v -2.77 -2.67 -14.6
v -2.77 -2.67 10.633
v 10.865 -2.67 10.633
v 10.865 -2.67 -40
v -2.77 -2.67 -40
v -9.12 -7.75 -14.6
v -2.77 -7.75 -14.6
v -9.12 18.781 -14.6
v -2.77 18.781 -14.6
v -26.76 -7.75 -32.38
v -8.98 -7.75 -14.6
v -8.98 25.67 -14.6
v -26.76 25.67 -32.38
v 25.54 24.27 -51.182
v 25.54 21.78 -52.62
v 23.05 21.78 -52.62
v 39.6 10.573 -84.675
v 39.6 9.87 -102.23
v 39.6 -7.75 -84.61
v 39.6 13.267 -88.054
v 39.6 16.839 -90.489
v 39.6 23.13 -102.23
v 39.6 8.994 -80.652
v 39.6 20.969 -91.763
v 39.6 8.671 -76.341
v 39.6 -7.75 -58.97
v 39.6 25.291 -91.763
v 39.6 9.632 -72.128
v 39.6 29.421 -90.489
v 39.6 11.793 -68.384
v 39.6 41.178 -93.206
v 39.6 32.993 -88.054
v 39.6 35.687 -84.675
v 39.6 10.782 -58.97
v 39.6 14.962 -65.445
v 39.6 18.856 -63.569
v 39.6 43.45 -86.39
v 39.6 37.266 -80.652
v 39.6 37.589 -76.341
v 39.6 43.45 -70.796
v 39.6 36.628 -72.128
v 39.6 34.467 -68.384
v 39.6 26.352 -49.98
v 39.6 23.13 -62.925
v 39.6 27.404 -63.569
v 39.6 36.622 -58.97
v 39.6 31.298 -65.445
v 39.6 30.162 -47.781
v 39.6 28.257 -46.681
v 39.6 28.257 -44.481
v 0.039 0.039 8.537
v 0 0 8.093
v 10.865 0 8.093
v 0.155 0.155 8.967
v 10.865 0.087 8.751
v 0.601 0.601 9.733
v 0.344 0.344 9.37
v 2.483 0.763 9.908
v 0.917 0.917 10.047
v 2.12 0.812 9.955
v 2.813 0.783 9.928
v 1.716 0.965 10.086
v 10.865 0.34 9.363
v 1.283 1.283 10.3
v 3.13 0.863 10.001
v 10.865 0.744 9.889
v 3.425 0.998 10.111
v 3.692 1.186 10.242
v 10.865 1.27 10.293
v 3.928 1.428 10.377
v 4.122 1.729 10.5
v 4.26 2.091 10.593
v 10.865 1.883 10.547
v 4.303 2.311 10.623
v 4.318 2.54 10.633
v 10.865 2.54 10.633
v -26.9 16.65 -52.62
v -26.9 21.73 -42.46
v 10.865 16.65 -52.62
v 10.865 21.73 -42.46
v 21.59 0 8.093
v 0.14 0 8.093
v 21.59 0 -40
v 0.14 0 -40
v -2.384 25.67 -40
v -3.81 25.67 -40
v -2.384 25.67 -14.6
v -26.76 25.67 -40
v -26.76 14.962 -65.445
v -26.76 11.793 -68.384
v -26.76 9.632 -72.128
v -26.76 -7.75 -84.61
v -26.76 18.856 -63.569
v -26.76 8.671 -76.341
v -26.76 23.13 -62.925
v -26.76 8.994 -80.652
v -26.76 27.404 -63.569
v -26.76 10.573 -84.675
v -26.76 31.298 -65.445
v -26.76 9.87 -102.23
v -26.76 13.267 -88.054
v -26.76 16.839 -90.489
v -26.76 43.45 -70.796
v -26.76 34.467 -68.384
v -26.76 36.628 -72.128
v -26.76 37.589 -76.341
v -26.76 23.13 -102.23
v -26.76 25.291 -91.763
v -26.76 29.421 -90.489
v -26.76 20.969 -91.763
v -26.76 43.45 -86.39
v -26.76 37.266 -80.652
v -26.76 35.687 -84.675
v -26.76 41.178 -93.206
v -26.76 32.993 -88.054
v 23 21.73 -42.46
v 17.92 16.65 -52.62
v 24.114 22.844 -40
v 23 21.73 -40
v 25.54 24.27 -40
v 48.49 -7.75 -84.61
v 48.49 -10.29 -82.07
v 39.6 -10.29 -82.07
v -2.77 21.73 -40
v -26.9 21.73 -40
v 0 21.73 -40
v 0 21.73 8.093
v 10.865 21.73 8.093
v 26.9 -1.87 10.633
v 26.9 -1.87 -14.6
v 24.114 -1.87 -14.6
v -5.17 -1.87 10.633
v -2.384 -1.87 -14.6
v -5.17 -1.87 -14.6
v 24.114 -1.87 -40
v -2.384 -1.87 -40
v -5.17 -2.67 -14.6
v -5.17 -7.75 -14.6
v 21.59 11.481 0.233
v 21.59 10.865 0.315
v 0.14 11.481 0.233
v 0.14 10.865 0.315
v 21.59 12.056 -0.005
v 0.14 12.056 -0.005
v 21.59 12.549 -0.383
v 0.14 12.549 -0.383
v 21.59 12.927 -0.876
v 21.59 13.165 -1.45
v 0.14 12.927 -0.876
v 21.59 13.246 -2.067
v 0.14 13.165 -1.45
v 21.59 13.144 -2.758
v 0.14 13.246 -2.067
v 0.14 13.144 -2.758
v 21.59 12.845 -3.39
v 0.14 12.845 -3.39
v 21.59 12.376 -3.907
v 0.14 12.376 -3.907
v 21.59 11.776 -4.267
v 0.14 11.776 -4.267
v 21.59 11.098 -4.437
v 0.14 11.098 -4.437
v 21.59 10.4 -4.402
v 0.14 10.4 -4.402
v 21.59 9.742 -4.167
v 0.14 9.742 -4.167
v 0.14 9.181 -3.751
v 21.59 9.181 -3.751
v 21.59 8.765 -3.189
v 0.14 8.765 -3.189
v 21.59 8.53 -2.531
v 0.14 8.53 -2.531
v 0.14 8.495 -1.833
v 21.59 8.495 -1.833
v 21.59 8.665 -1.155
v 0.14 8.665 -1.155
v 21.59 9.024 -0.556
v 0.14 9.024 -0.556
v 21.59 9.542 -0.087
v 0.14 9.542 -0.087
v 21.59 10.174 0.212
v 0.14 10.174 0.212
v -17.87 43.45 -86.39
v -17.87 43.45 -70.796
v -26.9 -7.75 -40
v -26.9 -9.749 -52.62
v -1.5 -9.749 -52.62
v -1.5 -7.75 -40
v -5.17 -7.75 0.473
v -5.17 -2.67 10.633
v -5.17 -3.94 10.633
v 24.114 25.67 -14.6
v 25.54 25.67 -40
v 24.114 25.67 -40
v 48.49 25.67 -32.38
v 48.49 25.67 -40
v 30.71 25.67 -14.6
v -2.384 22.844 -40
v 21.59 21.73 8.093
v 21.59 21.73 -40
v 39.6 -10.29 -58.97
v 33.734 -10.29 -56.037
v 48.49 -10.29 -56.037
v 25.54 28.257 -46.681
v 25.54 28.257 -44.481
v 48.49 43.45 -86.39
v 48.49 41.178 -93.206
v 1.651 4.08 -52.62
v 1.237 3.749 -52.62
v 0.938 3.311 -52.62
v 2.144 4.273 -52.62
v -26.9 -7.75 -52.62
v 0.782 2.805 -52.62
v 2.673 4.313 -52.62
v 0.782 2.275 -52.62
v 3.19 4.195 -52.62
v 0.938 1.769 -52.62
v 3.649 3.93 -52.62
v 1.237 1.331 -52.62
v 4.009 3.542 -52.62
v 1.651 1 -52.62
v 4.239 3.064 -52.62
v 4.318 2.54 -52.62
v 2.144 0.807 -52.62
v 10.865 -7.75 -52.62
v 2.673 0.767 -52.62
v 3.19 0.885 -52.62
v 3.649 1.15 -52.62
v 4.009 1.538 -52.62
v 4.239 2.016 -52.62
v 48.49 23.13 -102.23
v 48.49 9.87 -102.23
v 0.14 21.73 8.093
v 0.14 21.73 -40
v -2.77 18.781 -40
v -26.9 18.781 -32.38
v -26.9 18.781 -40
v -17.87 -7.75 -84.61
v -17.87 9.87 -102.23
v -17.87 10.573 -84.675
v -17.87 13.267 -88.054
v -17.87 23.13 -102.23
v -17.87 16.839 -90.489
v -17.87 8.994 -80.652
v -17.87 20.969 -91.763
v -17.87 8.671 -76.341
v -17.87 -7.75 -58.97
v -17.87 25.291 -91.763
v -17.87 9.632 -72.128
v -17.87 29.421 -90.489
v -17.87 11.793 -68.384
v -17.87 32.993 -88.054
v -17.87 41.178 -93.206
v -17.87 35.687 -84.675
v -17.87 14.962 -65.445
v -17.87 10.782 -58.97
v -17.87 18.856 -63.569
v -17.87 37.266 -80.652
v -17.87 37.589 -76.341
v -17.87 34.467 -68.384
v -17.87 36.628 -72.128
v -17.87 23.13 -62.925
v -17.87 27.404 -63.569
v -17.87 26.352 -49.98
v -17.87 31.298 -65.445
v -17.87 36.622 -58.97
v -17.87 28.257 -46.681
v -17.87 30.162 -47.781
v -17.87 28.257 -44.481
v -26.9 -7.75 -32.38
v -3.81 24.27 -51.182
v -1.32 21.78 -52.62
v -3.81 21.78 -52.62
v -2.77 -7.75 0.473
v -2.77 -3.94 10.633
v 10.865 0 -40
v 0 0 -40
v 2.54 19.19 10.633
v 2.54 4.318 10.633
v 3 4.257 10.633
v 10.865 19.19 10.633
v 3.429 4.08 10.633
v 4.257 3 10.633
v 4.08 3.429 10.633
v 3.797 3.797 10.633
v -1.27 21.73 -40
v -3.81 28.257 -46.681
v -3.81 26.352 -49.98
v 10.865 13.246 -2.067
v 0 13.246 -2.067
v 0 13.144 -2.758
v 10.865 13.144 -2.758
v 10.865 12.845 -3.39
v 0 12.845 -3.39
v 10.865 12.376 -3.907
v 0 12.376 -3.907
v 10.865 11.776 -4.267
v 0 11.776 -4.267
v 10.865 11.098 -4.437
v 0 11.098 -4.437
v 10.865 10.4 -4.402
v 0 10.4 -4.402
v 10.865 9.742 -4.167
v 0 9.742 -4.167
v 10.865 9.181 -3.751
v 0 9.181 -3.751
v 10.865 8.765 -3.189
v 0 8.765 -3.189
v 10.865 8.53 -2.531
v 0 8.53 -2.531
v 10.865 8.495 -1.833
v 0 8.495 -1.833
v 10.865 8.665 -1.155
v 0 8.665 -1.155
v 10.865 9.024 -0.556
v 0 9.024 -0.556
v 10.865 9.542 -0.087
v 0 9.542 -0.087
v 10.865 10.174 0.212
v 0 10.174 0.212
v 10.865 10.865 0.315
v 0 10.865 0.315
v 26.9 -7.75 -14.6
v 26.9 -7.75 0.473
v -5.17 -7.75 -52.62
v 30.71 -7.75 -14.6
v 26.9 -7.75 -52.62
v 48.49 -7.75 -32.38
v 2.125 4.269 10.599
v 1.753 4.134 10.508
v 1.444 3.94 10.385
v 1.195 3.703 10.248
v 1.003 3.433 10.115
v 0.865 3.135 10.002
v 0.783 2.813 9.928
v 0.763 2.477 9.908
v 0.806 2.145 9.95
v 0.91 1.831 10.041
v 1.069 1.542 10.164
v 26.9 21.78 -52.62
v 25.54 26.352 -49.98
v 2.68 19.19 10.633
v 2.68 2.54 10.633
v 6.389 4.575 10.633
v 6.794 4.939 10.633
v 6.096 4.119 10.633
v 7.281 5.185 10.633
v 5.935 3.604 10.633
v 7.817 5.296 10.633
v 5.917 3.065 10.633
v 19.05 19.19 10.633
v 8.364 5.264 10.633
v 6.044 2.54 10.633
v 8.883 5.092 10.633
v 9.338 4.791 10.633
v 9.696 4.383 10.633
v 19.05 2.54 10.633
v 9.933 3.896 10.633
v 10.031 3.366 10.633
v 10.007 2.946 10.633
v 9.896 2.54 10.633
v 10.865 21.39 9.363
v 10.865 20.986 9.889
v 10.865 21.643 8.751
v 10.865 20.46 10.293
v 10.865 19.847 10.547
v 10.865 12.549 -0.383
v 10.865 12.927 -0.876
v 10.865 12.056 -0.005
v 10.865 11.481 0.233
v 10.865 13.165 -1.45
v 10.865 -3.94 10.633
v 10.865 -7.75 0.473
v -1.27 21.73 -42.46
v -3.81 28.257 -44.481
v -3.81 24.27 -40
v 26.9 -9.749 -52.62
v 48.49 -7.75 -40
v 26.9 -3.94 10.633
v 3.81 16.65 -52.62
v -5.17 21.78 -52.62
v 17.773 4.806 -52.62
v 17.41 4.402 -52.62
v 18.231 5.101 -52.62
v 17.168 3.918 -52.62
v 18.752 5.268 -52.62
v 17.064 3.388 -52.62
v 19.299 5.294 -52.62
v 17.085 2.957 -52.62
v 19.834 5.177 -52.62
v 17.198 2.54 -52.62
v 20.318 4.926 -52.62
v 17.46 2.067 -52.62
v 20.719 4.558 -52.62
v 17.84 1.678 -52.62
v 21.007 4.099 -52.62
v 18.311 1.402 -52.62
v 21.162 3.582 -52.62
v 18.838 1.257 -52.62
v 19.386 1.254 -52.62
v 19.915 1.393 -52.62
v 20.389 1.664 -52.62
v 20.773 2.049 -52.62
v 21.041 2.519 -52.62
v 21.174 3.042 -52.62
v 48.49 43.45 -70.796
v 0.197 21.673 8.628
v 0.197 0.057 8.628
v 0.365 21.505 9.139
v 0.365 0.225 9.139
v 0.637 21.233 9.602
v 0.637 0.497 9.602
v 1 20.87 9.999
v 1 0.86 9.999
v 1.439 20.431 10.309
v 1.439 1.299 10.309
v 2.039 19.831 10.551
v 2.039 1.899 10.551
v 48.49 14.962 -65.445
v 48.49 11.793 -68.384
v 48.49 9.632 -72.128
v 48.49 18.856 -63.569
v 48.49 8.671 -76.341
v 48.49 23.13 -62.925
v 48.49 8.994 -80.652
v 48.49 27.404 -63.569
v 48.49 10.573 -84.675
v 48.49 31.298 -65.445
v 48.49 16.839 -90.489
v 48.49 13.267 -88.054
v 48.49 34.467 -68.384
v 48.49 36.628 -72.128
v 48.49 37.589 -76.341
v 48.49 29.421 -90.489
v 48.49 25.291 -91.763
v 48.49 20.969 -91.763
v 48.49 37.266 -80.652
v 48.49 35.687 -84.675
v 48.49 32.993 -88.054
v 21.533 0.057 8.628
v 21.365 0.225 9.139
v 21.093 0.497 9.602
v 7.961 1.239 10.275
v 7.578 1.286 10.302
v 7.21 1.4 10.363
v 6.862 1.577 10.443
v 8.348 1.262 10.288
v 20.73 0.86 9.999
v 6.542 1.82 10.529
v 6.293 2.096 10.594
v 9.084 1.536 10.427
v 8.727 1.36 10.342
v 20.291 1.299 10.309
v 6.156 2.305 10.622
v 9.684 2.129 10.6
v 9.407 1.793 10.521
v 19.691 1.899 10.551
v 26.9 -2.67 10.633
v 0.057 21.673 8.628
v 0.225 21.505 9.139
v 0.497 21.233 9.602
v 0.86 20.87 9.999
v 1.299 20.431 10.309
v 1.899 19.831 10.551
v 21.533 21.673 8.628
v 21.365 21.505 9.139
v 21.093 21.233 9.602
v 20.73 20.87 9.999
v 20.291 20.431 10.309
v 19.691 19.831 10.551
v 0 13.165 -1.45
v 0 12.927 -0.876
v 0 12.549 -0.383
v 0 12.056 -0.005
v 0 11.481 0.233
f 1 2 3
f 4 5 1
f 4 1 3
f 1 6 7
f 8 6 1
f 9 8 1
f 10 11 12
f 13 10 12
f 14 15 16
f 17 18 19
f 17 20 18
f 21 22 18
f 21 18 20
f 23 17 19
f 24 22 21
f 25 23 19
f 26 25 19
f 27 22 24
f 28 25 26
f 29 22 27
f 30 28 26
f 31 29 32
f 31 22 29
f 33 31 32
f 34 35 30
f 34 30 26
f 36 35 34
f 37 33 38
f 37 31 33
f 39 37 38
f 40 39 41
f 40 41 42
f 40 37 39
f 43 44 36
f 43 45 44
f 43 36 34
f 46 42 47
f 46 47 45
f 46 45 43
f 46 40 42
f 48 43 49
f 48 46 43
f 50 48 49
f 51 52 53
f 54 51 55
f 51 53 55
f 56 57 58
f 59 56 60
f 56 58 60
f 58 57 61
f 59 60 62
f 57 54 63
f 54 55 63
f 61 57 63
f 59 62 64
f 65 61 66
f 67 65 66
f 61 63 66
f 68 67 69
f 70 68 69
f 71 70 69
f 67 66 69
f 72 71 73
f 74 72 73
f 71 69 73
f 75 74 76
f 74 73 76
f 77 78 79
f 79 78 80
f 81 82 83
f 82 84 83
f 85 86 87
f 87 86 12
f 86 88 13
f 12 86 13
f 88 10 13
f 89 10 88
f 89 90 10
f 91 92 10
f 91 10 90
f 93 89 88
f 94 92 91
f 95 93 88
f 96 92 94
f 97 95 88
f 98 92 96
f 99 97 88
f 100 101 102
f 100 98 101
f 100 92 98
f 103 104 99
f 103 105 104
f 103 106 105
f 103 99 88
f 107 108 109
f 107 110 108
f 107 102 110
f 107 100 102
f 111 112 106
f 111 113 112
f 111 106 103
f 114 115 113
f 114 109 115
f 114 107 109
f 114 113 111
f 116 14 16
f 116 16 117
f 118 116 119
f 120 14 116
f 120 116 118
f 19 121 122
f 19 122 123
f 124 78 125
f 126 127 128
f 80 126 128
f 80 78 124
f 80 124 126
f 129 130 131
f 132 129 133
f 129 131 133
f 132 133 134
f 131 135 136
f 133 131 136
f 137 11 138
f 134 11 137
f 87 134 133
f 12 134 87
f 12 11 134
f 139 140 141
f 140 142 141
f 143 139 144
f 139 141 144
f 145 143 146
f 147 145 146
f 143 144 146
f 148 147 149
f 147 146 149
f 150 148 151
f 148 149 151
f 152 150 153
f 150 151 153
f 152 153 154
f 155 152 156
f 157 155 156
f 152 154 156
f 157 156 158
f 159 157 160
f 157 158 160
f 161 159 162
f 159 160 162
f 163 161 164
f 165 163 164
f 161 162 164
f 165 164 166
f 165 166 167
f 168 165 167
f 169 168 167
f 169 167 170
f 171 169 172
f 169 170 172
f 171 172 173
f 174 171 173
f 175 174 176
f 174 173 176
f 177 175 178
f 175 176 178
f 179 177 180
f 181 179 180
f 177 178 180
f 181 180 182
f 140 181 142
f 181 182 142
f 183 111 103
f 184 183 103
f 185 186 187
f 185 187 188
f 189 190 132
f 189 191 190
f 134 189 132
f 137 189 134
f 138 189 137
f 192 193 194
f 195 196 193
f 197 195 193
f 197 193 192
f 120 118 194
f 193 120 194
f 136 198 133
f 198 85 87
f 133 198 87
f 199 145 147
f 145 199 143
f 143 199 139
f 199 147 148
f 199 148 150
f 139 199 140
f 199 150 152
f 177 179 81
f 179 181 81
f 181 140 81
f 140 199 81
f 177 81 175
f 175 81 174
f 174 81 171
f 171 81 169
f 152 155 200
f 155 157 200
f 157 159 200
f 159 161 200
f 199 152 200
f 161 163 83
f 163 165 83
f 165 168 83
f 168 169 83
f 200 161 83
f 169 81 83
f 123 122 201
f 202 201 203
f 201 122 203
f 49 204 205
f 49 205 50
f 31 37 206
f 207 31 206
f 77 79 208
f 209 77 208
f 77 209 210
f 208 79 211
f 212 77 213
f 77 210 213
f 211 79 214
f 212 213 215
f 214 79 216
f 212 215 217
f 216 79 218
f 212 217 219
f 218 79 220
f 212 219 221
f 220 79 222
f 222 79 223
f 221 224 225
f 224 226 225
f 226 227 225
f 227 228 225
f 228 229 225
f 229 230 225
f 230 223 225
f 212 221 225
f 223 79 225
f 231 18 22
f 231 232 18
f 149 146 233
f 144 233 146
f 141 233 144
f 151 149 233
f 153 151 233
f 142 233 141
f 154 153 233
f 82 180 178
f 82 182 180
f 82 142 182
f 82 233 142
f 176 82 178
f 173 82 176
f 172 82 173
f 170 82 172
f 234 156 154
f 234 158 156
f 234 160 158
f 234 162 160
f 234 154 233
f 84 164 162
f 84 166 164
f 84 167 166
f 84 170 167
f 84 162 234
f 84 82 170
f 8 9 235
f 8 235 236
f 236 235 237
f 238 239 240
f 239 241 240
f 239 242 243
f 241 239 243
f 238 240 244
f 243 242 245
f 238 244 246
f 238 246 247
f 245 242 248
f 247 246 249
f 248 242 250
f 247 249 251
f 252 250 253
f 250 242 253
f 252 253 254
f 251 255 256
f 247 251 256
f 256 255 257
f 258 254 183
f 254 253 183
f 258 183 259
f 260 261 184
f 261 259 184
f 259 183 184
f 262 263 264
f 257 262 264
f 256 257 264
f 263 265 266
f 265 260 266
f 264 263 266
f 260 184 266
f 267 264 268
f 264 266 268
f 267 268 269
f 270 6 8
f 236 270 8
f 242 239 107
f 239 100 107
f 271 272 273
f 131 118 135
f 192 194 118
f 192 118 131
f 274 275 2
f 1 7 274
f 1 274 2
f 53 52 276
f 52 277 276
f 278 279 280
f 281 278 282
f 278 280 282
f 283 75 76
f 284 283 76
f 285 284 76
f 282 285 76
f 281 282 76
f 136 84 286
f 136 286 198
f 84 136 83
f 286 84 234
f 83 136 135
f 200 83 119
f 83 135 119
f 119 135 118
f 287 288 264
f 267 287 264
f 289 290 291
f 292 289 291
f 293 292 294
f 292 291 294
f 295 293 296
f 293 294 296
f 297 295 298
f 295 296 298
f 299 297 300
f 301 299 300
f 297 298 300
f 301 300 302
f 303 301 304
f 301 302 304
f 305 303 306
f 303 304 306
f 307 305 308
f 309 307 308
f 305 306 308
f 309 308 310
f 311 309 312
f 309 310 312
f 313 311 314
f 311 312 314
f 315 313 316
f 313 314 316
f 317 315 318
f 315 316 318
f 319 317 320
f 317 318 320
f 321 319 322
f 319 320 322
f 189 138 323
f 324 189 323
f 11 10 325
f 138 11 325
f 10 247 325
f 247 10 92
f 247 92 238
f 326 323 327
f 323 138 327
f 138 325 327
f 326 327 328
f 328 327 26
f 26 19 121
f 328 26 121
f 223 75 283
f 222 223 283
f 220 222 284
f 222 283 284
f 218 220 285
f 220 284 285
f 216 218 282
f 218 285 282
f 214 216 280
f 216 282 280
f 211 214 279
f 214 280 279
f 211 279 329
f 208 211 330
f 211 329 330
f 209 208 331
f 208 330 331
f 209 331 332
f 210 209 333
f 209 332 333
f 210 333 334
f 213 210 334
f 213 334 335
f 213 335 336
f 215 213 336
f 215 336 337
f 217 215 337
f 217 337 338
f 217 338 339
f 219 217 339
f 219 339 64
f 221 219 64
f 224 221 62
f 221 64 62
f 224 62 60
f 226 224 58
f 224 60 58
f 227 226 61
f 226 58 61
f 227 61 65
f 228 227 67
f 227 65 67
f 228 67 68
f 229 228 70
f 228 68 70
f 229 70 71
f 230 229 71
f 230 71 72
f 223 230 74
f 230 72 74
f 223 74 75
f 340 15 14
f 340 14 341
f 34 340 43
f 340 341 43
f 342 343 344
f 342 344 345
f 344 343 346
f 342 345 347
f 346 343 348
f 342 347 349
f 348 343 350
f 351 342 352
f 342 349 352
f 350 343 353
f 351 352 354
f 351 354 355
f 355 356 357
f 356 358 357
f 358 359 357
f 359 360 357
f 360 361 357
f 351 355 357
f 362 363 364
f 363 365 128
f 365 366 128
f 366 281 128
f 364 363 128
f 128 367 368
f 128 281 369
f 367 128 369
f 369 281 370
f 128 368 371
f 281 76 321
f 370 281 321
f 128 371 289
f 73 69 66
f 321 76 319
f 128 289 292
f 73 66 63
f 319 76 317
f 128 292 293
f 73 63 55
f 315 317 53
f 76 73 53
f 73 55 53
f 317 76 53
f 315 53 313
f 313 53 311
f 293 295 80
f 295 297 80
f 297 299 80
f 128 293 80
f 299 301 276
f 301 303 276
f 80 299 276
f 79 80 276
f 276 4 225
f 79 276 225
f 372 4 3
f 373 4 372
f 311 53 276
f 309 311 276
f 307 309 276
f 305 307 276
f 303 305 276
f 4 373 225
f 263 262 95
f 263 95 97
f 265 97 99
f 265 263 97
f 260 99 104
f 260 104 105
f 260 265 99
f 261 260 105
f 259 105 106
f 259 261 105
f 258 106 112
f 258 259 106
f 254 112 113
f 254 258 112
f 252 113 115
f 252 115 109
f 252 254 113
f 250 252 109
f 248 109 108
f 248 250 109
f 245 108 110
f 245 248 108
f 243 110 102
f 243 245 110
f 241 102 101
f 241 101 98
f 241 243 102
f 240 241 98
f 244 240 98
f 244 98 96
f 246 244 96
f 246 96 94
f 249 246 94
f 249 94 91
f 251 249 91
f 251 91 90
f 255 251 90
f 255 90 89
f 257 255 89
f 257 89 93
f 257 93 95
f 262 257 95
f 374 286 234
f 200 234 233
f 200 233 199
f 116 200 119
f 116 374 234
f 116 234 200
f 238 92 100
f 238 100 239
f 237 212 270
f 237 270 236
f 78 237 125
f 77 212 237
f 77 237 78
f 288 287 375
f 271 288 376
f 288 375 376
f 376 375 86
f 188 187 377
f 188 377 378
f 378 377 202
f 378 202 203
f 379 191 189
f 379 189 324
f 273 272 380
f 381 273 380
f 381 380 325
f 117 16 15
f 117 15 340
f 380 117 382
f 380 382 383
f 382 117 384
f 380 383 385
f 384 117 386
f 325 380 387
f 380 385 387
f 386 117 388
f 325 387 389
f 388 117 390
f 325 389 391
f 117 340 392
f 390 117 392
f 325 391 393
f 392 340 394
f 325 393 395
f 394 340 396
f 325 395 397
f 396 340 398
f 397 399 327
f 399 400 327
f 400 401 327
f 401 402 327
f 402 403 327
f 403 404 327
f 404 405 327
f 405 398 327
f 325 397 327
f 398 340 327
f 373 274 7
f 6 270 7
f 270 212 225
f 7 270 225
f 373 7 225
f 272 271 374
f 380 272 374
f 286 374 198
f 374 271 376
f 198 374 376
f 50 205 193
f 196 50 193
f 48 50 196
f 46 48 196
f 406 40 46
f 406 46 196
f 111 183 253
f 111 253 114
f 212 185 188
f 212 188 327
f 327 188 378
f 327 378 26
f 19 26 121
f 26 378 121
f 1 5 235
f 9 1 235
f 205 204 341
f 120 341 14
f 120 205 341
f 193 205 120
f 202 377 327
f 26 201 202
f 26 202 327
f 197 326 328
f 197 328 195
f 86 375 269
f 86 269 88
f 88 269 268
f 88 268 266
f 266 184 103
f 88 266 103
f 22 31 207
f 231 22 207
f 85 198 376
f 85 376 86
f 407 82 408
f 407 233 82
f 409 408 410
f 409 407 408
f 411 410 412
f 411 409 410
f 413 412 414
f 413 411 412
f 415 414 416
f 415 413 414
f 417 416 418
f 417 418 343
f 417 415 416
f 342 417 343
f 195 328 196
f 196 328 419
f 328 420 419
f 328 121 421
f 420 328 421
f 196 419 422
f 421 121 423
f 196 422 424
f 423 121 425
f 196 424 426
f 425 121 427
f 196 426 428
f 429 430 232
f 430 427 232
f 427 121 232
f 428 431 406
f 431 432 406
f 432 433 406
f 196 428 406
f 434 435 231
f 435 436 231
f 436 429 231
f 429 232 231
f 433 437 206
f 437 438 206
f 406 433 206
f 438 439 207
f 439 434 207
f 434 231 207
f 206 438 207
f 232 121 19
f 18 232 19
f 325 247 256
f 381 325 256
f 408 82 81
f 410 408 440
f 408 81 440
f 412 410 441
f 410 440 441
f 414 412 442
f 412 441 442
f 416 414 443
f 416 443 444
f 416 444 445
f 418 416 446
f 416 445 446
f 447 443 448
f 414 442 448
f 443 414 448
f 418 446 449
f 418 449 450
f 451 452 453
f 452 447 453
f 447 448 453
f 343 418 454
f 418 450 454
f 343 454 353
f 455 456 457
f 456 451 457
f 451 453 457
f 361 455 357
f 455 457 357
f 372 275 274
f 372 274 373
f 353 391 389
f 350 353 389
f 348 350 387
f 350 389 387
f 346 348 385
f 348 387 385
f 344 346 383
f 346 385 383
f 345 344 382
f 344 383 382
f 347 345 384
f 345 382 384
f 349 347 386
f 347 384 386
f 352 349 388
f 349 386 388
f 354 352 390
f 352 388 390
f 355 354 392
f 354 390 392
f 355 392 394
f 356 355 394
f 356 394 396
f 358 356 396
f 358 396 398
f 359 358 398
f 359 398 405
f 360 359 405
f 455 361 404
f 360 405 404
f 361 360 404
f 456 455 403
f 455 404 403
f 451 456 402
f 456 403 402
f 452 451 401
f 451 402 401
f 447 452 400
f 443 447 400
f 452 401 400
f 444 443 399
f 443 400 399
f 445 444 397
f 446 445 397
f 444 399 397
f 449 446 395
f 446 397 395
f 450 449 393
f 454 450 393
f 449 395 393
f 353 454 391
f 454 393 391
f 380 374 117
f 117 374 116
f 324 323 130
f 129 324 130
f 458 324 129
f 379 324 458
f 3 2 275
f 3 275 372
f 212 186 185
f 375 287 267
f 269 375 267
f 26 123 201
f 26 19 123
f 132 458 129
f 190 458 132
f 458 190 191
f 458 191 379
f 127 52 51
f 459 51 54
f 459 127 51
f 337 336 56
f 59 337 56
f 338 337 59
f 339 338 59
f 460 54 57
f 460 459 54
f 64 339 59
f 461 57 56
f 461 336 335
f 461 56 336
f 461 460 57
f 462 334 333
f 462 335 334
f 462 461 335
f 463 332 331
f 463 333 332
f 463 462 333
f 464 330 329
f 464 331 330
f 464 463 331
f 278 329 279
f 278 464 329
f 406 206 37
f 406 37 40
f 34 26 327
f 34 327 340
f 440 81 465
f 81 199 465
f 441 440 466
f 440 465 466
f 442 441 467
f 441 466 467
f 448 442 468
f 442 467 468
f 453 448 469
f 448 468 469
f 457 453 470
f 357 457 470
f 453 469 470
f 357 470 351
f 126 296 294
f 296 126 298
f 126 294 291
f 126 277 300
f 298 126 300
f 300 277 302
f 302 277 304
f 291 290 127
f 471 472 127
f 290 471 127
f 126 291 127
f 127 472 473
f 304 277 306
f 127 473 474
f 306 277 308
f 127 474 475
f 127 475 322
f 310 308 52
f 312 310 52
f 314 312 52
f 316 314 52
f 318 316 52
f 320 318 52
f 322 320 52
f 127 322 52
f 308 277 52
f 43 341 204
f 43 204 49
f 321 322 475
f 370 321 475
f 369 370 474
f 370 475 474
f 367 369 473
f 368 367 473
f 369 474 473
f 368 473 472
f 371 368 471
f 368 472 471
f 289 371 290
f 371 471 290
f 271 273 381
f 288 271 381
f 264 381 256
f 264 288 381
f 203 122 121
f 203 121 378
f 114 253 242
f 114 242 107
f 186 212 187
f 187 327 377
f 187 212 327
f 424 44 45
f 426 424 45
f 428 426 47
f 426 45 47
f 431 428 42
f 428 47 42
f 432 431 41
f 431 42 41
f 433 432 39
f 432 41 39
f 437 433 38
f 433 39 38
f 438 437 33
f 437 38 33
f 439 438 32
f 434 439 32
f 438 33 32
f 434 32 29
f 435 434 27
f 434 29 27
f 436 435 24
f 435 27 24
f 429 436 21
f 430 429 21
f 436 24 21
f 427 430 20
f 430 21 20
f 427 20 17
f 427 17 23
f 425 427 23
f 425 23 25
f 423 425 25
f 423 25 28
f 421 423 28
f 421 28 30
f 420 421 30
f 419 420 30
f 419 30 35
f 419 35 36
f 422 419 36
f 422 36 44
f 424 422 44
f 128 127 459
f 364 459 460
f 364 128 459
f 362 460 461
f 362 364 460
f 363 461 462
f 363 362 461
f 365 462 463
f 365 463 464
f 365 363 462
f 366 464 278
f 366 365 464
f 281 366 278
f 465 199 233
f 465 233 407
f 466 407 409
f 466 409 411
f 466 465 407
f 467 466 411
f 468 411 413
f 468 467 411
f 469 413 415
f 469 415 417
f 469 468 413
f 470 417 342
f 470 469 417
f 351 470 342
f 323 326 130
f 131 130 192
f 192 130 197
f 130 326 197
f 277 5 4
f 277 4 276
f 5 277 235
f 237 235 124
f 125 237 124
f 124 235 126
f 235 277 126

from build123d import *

# Parameters (mm, degrees)
BOSS_EXTRUDE1_DEPTH      = 21.73
BOSS_EXTRUDE2_DEPTH      = 23.229999974
BOSS_EXTRUDE2_DEPTH_BACK = 1.5
SKETCH2_W                = 19.05
SKETCH2_H                = 24.729999974
BOSS_EXTRUDE3_DEPTH      = 25.4
SKETCH3_W                = 6.35
SKETCH3_H                = 24.729999974
BOSS_EXTRUDE4_DEPTH      = 43.18
SKETCH4_W                = 19.05
SKETCH4_H                = 24.729999974
CUT_EXTRUDE1_DEPTH       = 14.05
SKETCH5_W                = 43.64
SKETCH5_H                = 24.729999974
BOSS_EXTRUDE5_DEPTH      = 7.62
BOSS_EXTRUDE6_DEPTH      = 8.789999946
BOSS_EXTRUDE7_DEPTH      = 20.219999946
SKETCH9_W                = 49.61
SKETCH9_H                = 53.739999866
BOSS_EXTRUDE8_DEPTH      = 2.54
SKETCH10_R               = 14.5
CUT_EXTRUDE2_DEPTH       = 44.704
FILLET3_R                = 2.54
CHAMFER1_SIZE            = 20.16
CHAMFER2_SIZE            = 20.32
CHAMFER2_SIZE2           = 10.16
SKETCH12_W               = 23.23
SKETCH12_H               = 21.71999992
CUT_EXTRUDE4_DEPTH       = 23.114
SKETCH13_W               = 12.62
SKETCH13_H               = 21.71999992
CUT_EXTRUDE5_DEPTH       = 3.81
CHAMFER4_SIZE            = 2.54
CHAMFER7_SIZE            = 17.78
CHAMFER7_SIZE2           = 30.795863359
CHAMFER8_SIZE            = 2.54
CHAMFER8_SIZE2           = 16.036928847
CHAMFER10_SIZE           = 12.7
CHAMFER10_SIZE2          = 6.35
SKETCH16_W               = 21.59
SKETCH16_H               = 33.419999866
BOSS_EXTRUDE9_DEPTH      = 25.4
BOSS_EXTRUDE10_DEPTH     = 25.4
CHAMFER12_SIZE           = 5.08
CHAMFER12_SIZE2          = 10.16
CHAMFER13_SIZE           = 2.54
CHAMFER13_SIZE2          = 5.679612663
SKETCH18_W               = 24.13
SKETCH18_H               = 29.479999946
BOSS_EXTRUDE11_DEPTH     = 25.4
SKETCH11_R               = 1.778
CUT_EXTRUDE9_DEPTH       = 131.296968124
CHAMFER14_SIZE           = 17.78
SKETCH19_W               = 29.67
SKETCH19_H               = 5.08
BOSS_EXTRUDE12_DEPTH     = 50.633268
CHAMFER15_SIZE           = 10.16
CHAMFER15_SIZE2          = 3.81
CUT_EXTRUDE10_DEPTH      = 122.202951668
CUT_EXTRUDE11_REACH      = 92.065
SKETCH21_W               = 24.13
SKETCH21_H               = 2.948571429
CUT_EXTRUDE13_DEPTH      = 26.67
CUT_EXTRUDE14_DEPTH      = 31.496
CHAMFER17_SIZE           = 2.54
CHAMFER17_SIZE2          = 4.399409051
CHAMFER18_SIZE           = 2.54
CHAMFER18_SIZE2          = 4.399409051
CHAMFER19_SIZE           = 1.27
SKETCH26_W               = 25.4
SKETCH26_H               = 28.339999866
BOSS_EXTRUDE13_DEPTH     = 2.785625036
BOSS_EXTRUDE14_DEPTH     = 0.8
SKETCH30_R               = 2.032
CUT_EXTRUDE16_DEPTH      = 89.17795503


with BuildPart() as part:
    # Sketch1 → Boss-Extrude1 (new body)
    with BuildSketch(Plane(origin=(0, 0, 0), x_dir=(1, 0, 0), z_dir=(0, 1, 0))):
        Polygon((-1.5, 40), (0, 40), (21.59, 40), (23.09, 40), (23.09, 45), (-1.5, 45), align=None)
        Polygon((0, 40), (0, 0), (0, -10.633268202), (21.59, -10.633268202), (21.59, 0), (21.59, 40), align=None)
    extrude(amount=BOSS_EXTRUDE1_DEPTH)

    # Sketch1<4> → Boss-Extrude2 (add, two sides)
    with BuildSketch(Plane(origin=(0, 0, 0), x_dir=(1, 0, 0), z_dir=(0, 1, 0))) as boss_extrude2_sk:
        Polygon((-1.5, 40), (0, 40), (21.59, 40), (23.09, 40), (23.09, 45), (-1.5, 45), align=None)
    extrude(amount=BOSS_EXTRUDE2_DEPTH)
    extrude(boss_extrude2_sk.sketch, amount=-BOSS_EXTRUDE2_DEPTH_BACK)

    # Sketch2 → Boss-Extrude3 (add)
    with BuildSketch(Plane(origin=(23.09, 0, 0), x_dir=(0, 0, -1), z_dir=(1, 0, 0))):
        with Locations((49.525, 10.864999987)):
            Rectangle(SKETCH2_W, SKETCH2_H)
    extrude(amount=BOSS_EXTRUDE3_DEPTH)

    # Sketch3 → Boss-Extrude4 (add)
    with BuildSketch(Plane(origin=(0, 0, -59.05), x_dir=(-1, 0, 0), z_dir=(0, 0, -1))):
        with Locations((-45.315, 10.864999987)):
            Rectangle(SKETCH3_W, SKETCH3_H)
    extrude(amount=BOSS_EXTRUDE4_DEPTH)

    # Sketch4 → Cut-Extrude1 (cut)
    with BuildSketch(Plane(origin=(0, 0, -59.05), x_dir=(-1, 0, 0), z_dir=(0, 0, -1))):
        with Locations((-32.615, 10.864999987)):
            Rectangle(SKETCH4_W, SKETCH4_H)
    extrude(amount=-CUT_EXTRUDE1_DEPTH, mode=Mode.SUBTRACT)

    # Sketch5 → Boss-Extrude5 (add)
    with BuildSketch(Plane(origin=(0, 0, -45), x_dir=(-1, 0, 0), z_dir=(0, 0, -1))):
        with Locations((-20.32, 10.864999987)):
            Rectangle(SKETCH5_W, SKETCH5_H)
    extrude(amount=BOSS_EXTRUDE5_DEPTH)

    # Sketch6 → Boss-Extrude6 (add)
    with BuildSketch(Plane.XZ.offset(1.5)):
        Polygon((-1.5, -40), (48.49, -40), (48.49, -46.27), (48.49, -102.23), (42.14, -102.23), (42.14, -52.62), (-1.5, -52.62), align=None)
    extrude(amount=BOSS_EXTRUDE6_DEPTH)

    # Sketch7 → Boss-Extrude7 (add)
    with BuildSketch(Plane(origin=(0, 23.229999974, 0), x_dir=(1, 0, 0), z_dir=(0, 1, 0))):
        Polygon((-1.5, 40), (48.49, 40), (48.49, 46.27), (48.49, 102.23), (42.14, 102.23), (42.14, 52.62), (-1.5, 52.62), align=None)
    extrude(amount=BOSS_EXTRUDE7_DEPTH)

    # Sketch9 → Boss-Extrude8 (add)
    with BuildSketch(Plane.ZY.offset(-42.14)):
        with Locations((-77.425, 16.579999987)):
            Rectangle(SKETCH9_W, SKETCH9_H)
    extrude(amount=BOSS_EXTRUDE8_DEPTH)

    # Sketch10 → Cut-Extrude2 (cut)
    with BuildSketch(Plane.ZY.offset(-39.6)):
        with Locations((-77.425, 23.12999992)):
            Circle(SKETCH10_R)
    extrude(amount=-CUT_EXTRUDE2_DEPTH, mode=Mode.SUBTRACT)

    # Fillet3
    fillet3_edges = [part.edges().sort_by_distance(p)[0] for p in [
        (10.795, 0, 10.633268202),
        (10.795, 21.73, 10.633268202),
        (21.59, 10.865, 10.633268202),
        (0, 10.865, 10.633268202),
    ]]
    fillet(fillet3_edges, radius=FILLET3_R)

    # Chamfer1
    chamfer1_edges = [part.edges().sort_by_distance(p)[0] for p in [
        (44.045, -10.289999946, -102.23),
    ]]
    chamfer(chamfer1_edges, length=CHAMFER1_SIZE)

    # Chamfer2
    chamfer2_edges = [part.edges().sort_by_distance(p)[0] for p in [
        (44.045, 43.44999992, -102.23),
    ]]
    chamfer2_side = [part.faces().sort_by_distance(p)[0] for p in [
        (44.045, 26.659999987, -102.23),
    ]]
    chamfer(chamfer2_edges, length=CHAMFER2_SIZE, length2=CHAMFER2_SIZE2, reference=chamfer2_side[0])

    # Sketch12 → Cut-Extrude4 (cut)
    with BuildSketch(Plane.XY.offset(-40)):
        with Locations((10.115, 32.58999996)):
            Rectangle(SKETCH12_W, SKETCH12_H)
    extrude(amount=-CUT_EXTRUDE4_DEPTH, mode=Mode.SUBTRACT)

    # Sketch13 → Cut-Extrude5 (cut)
    with BuildSketch(Plane.ZY.offset(-21.73)):
        with Locations((-46.31, 32.58999996)):
            Rectangle(SKETCH13_W, SKETCH13_H)
    extrude(amount=-CUT_EXTRUDE5_DEPTH, mode=Mode.SUBTRACT)

    # Chamfer4
    chamfer4_edges = [part.edges().sort_by_distance(p)[0] for p in [
        (25.54, 21.73, -46.31),
    ]]
    chamfer(chamfer4_edges, length=CHAMFER4_SIZE)

    # Chamfer7
    chamfer7_edges = [part.edges().sort_by_distance(p)[0] for p in [
        (37.015, 43.44999992, -40),
    ]]
    chamfer7_side = [part.faces().sort_by_distance(p)[0] for p in [
        (31.271893958, 12.476304807, -40),
    ]]
    chamfer(chamfer7_edges, length=CHAMFER7_SIZE, length2=CHAMFER7_SIZE2, reference=chamfer7_side[0])

    # Chamfer8
    chamfer8_edges = [part.edges().sort_by_distance(p)[0] for p in [
        (23.495, -10.289999946, -40),
    ]]
    chamfer8_side = [part.faces().sort_by_distance(p)[0] for p in [
        (29.3591267, 5.121230979, -40),
    ]]
    chamfer(chamfer8_edges, length=CHAMFER8_SIZE, length2=CHAMFER8_SIZE2, reference=chamfer8_side[0])

    # Chamfer10
    chamfer10_edges = [part.edges().sort_by_distance(p)[0] for p in [
        (39.6, 11.603674367, -52.62),
    ]]
    chamfer10_side = [part.faces().sort_by_distance(p)[0] for p in [
        (20.529332087, 8.343955773, -52.62),
    ]]
    chamfer(chamfer10_edges, length=CHAMFER10_SIZE, length2=CHAMFER10_SIZE2, reference=chamfer10_side[0])

    # Sketch16 → Boss-Extrude9 (add)
    with BuildSketch(Plane.XY.offset(-40)):
        with Locations((37.695, 8.959999987)):
            Rectangle(SKETCH16_W, SKETCH16_H)
    extrude(amount=BOSS_EXTRUDE9_DEPTH)

    # Sketch17 → Boss-Extrude10 (add)
    with BuildSketch(Plane.ZY.offset(1.5)):
        Polygon((-52.62, 21.73), (-52.62, -9.748811583), (-40, -7.749999946), (-40, 21.73), align=None)
    extrude(amount=BOSS_EXTRUDE10_DEPTH)

    # Chamfer12
    chamfer12_edges = [part.edges().sort_by_distance(p)[0] for p in [
        (-1.95, 21.73, -52.62),
    ]]
    chamfer12_side = [part.faces().sort_by_distance(p)[0] for p in [
        (0.280348521, 6.212260244, -52.62),
    ]]
    chamfer(chamfer12_edges, length=CHAMFER12_SIZE, length2=CHAMFER12_SIZE2, reference=chamfer12_side[0])

    # Chamfer13
    chamfer13_edges = [part.edges().sort_by_distance(p)[0] for p in [
        (44.045, 43.44999992, -92.07),
    ]]
    chamfer13_side = [part.faces().sort_by_distance(p)[0] for p in [
        (44.045, 33.28999992, -97.15),
    ]]
    chamfer(chamfer13_edges, length=CHAMFER13_SIZE, length2=CHAMFER13_SIZE2, reference=chamfer13_side[0])

    # Sketch18 → Boss-Extrude11 (add)
    with BuildSketch(Plane.XY.offset(-40)):
        with Locations((-14.835, 6.990000027)):
            Rectangle(SKETCH18_W, SKETCH18_H)
    extrude(amount=BOSS_EXTRUDE11_DEPTH)

    # Sketch11 → Cut-Extrude9 (cut, through all)
    with BuildSketch(Plane.XY.offset(10.633268202)):
        with Locations((2.54, 2.54)):
            Circle(SKETCH11_R)
    extrude(amount=-CUT_EXTRUDE9_DEPTH, mode=Mode.SUBTRACT)

    # Chamfer14
    chamfer14_edges = [part.edges().sort_by_distance(p)[0] for p in [
        (48.49, 8.959999987, -14.6),
        (-26.9, 6.990000027, -14.6),
    ]]
    chamfer(chamfer14_edges, length=CHAMFER14_SIZE)

    # Sketch19 → Boss-Extrude12 (add, through all)
    with BuildSketch(Plane.XY.offset(-40)):
        with Locations((12.065, -5.209999946)):
            Rectangle(SKETCH19_W, SKETCH19_H)
    extrude(amount=BOSS_EXTRUDE12_DEPTH)

    # Chamfer15
    chamfer15_edges = [part.edges().sort_by_distance(p)[0] for p in [
        (12.065, -7.749999946, 10.633268),
    ]]
    chamfer15_side = [part.faces().sort_by_distance(p)[0] for p in [
        (11.2000407, -7.749999946, -20.137931454),
    ]]
    chamfer(chamfer15_edges, length=CHAMFER15_SIZE, length2=CHAMFER15_SIZE2, reference=chamfer15_side[0])

    # Sketch20 → Cut-Extrude10 (cut, through all)
    with BuildSketch(Plane.ZY):
        with BuildLine():
            ThreePointArc((0.314518202, 10.865), (-0.382933775, 12.548798023), (-2.066731798, 13.24625))
            Line((-2.066731798, 13.24625), (-2.066731798, 10.865))
            Line((-2.066731798, 10.865), (0.314518202, 10.865))
        make_face()
        with BuildLine():
            Line((-2.066731798, 10.865), (-2.066731798, 13.24625))
            ThreePointArc((-2.066731798, 13.24625), (-3.750529821, 9.181201977), (0.314518202, 10.865))
            Line((0.314518202, 10.865), (-2.066731798, 10.865))
        make_face()
    extrude(amount=-CUT_EXTRUDE10_DEPTH, mode=Mode.SUBTRACT)

    # Cut-Extrude11: up to this face of the body (flat: up to its plane)
    cut_extrude11_end = Plane(part.part.faces().sort_by_distance((-5.945, 6.990000027, -14.6))[0])
    # Sketch21 → Cut-Extrude11 (cut, up to the picked face)
    with BuildSketch(Plane(origin=(0, 0, -40), x_dir=(-1, 0, 0), z_dir=(0, 0, -1)), mode=Mode.PRIVATE) as cut_extrude11_sk1:
        with Locations((14.835, 20.255714286)):
            Rectangle(SKETCH21_W, SKETCH21_H)
    cut_extrude11_tool1 = split(extrude(cut_extrude11_sk1.sketch, amount=-CUT_EXTRUDE11_REACH, mode=Mode.PRIVATE), bisect_by=cut_extrude11_end, keep=Keep.BOTH, mode=Mode.PRIVATE)
    add(cut_extrude11_tool1.solids().sort_by(Axis((-14.835, 20.255714, -40), (0, 0, 1)))[0], mode=Mode.SUBTRACT)


with BuildPart() as body_2:
    # Split1: the piece on the far side of the plane
    add(part.part)
    split(bisect_by=Plane(origin=(0, -7.749999946, 0), x_dir=(0, 0, -1), z_dir=(0, -1, 0)), keep=Keep.BOTTOM)


with BuildPart() as part_1:
    add(part.part)

    # Split1
    split(bisect_by=Plane(origin=(0, -7.749999946, 0), x_dir=(0, 0, -1), z_dir=(0, -1, 0)), keep=Keep.TOP)


with BuildPart() as body_3:
    # Split2: the piece on the far side of the plane
    add(body_2.part)
    split(bisect_by=Plane(origin=(10.865000114, 0, 0), x_dir=(0, 0, -1), z_dir=(-1, 0, 0)), keep=Keep.BOTTOM)


with BuildPart() as body_2_1:
    add(body_2.part)

    # Split2
    split(bisect_by=Plane(origin=(10.865000114, 0, 0), x_dir=(0, 0, -1), z_dir=(-1, 0, 0)), keep=Keep.TOP)


with BuildPart() as body_4:
    # Mirror2: mirrored copy
    add(body_3.part.mirror(Plane.ZY.offset(-10.865000114)))

    # Combine1: union body 3
    add(body_3.part)

    # Sketch24 → Cut-Extrude13 (cut)
    with BuildSketch(Plane(origin=(0, 1.931991864, 1.115436023), x_dir=(1, 0, 0), z_dir=(0, 0.8660254037844406, 0.4999999999999968))):
        Polygon((-3.809999772, 62.048336906), (-3.809999772, 56.460336906), (-17.869999772, 56.460336906), (-17.869999772, 69.380685324), (-5.169999772, 62.048336906), align=None)
    cut_extrude13 = extrude(amount=-CUT_EXTRUDE13_DEPTH, mode=Mode.SUBTRACT)

    # Mirror3: Cut-Extrude13 across plane
    add(cut_extrude13.mirror(Plane.ZY.offset(-10.865000114)), mode=Mode.SUBTRACT)

    # Sketch25 → Cut-Extrude14 (cut)
    with BuildSketch(Plane(origin=(25.54, 0, 0), x_dir=(0, 0, -1), z_dir=(1, 0, 0))):
        Polygon((52.62, 21.780160317), (51.182490389, 24.27), (52.62, 24.27), align=None)
    extrude(amount=-CUT_EXTRUDE14_DEPTH, mode=Mode.SUBTRACT)

    # Chamfer17
    chamfer17_edges = [body_4.edges().sort_by_distance(p)[0] for p in [
        (32.57, 30.162160317, -47.780650044),
    ]]
    chamfer17_side = [body_4.faces().sort_by_distance(p)[0] for p in [
        (40.768870369, 32.663150898, -52.112492799),
    ]]
    chamfer(chamfer17_edges, length=CHAMFER17_SIZE, length2=CHAMFER17_SIZE2, reference=chamfer17_side[0])

    # Chamfer18
    chamfer18_edges = [body_4.edges().sort_by_distance(p)[0] for p in [
        (-10.839999772, 30.162160317, -47.780650044),
    ]]
    chamfer18_side = [body_4.faces().sort_by_distance(p)[0] for p in [
        (-19.038870141, 32.663150898, -52.112492799),
    ]]
    chamfer(chamfer18_edges, length=CHAMFER18_SIZE, length2=CHAMFER18_SIZE2, reference=chamfer18_side[0])

    # Chamfer19
    chamfer19_edges = [body_4.edges().sort_by_distance(p)[0] for p in [
        (32.57, 28.892160317, -45.580945518),
        (-10.839999772, 28.892160317, -45.580945518),
    ]]
    chamfer(chamfer19_edges, length=CHAMFER19_SIZE)

    # Sketch26 → Boss-Extrude13 (add)
    with BuildSketch(Plane.ZY.offset(-26.9)):
        with Locations((-27.3, 11.499999987)):
            Rectangle(SKETCH26_W, SKETCH26_H)
    boss_extrude13 = extrude(amount=BOSS_EXTRUDE13_DEPTH)

    # Mirror4: Boss-Extrude13 across plane
    add(boss_extrude13.mirror(Plane.ZY.offset(-10.865000162)))

    # Sketch27 → Boss-Extrude14 (add)
    with BuildSketch(Plane(origin=(0, -2.669999946, 0), x_dir=(1, 0, 0), z_dir=(0, 1, 0))):
        Polygon((24.114374964, 14.6), (26.9, 14.6), (26.9, -10.633268202), (-5.169999676, -10.633268202), (-5.169999676, 14.6), (-2.38437464, 14.6), (-2.38437464, 40), (24.114374964, 40), align=None)
    extrude(amount=BOSS_EXTRUDE14_DEPTH)

    # Sketch30 → Cut-Extrude16 (cut, through all)
    with BuildSketch(Plane(origin=(9.809684221, 0, -55.633483781), x_dir=(0, -1, 0), z_dir=(0.17364817766693072, 0, -0.984807753012208))):
        with Locations(Location((-3.269376543, -9.695540697, 0), (0, 0, 68.96457184))):
            Circle(SKETCH30_R)
    extrude(amount=-CUT_EXTRUDE16_DEPTH, mode=Mode.SUBTRACT)


solid = Compound([part_1.part, body_2_1.part, body_4.part])
